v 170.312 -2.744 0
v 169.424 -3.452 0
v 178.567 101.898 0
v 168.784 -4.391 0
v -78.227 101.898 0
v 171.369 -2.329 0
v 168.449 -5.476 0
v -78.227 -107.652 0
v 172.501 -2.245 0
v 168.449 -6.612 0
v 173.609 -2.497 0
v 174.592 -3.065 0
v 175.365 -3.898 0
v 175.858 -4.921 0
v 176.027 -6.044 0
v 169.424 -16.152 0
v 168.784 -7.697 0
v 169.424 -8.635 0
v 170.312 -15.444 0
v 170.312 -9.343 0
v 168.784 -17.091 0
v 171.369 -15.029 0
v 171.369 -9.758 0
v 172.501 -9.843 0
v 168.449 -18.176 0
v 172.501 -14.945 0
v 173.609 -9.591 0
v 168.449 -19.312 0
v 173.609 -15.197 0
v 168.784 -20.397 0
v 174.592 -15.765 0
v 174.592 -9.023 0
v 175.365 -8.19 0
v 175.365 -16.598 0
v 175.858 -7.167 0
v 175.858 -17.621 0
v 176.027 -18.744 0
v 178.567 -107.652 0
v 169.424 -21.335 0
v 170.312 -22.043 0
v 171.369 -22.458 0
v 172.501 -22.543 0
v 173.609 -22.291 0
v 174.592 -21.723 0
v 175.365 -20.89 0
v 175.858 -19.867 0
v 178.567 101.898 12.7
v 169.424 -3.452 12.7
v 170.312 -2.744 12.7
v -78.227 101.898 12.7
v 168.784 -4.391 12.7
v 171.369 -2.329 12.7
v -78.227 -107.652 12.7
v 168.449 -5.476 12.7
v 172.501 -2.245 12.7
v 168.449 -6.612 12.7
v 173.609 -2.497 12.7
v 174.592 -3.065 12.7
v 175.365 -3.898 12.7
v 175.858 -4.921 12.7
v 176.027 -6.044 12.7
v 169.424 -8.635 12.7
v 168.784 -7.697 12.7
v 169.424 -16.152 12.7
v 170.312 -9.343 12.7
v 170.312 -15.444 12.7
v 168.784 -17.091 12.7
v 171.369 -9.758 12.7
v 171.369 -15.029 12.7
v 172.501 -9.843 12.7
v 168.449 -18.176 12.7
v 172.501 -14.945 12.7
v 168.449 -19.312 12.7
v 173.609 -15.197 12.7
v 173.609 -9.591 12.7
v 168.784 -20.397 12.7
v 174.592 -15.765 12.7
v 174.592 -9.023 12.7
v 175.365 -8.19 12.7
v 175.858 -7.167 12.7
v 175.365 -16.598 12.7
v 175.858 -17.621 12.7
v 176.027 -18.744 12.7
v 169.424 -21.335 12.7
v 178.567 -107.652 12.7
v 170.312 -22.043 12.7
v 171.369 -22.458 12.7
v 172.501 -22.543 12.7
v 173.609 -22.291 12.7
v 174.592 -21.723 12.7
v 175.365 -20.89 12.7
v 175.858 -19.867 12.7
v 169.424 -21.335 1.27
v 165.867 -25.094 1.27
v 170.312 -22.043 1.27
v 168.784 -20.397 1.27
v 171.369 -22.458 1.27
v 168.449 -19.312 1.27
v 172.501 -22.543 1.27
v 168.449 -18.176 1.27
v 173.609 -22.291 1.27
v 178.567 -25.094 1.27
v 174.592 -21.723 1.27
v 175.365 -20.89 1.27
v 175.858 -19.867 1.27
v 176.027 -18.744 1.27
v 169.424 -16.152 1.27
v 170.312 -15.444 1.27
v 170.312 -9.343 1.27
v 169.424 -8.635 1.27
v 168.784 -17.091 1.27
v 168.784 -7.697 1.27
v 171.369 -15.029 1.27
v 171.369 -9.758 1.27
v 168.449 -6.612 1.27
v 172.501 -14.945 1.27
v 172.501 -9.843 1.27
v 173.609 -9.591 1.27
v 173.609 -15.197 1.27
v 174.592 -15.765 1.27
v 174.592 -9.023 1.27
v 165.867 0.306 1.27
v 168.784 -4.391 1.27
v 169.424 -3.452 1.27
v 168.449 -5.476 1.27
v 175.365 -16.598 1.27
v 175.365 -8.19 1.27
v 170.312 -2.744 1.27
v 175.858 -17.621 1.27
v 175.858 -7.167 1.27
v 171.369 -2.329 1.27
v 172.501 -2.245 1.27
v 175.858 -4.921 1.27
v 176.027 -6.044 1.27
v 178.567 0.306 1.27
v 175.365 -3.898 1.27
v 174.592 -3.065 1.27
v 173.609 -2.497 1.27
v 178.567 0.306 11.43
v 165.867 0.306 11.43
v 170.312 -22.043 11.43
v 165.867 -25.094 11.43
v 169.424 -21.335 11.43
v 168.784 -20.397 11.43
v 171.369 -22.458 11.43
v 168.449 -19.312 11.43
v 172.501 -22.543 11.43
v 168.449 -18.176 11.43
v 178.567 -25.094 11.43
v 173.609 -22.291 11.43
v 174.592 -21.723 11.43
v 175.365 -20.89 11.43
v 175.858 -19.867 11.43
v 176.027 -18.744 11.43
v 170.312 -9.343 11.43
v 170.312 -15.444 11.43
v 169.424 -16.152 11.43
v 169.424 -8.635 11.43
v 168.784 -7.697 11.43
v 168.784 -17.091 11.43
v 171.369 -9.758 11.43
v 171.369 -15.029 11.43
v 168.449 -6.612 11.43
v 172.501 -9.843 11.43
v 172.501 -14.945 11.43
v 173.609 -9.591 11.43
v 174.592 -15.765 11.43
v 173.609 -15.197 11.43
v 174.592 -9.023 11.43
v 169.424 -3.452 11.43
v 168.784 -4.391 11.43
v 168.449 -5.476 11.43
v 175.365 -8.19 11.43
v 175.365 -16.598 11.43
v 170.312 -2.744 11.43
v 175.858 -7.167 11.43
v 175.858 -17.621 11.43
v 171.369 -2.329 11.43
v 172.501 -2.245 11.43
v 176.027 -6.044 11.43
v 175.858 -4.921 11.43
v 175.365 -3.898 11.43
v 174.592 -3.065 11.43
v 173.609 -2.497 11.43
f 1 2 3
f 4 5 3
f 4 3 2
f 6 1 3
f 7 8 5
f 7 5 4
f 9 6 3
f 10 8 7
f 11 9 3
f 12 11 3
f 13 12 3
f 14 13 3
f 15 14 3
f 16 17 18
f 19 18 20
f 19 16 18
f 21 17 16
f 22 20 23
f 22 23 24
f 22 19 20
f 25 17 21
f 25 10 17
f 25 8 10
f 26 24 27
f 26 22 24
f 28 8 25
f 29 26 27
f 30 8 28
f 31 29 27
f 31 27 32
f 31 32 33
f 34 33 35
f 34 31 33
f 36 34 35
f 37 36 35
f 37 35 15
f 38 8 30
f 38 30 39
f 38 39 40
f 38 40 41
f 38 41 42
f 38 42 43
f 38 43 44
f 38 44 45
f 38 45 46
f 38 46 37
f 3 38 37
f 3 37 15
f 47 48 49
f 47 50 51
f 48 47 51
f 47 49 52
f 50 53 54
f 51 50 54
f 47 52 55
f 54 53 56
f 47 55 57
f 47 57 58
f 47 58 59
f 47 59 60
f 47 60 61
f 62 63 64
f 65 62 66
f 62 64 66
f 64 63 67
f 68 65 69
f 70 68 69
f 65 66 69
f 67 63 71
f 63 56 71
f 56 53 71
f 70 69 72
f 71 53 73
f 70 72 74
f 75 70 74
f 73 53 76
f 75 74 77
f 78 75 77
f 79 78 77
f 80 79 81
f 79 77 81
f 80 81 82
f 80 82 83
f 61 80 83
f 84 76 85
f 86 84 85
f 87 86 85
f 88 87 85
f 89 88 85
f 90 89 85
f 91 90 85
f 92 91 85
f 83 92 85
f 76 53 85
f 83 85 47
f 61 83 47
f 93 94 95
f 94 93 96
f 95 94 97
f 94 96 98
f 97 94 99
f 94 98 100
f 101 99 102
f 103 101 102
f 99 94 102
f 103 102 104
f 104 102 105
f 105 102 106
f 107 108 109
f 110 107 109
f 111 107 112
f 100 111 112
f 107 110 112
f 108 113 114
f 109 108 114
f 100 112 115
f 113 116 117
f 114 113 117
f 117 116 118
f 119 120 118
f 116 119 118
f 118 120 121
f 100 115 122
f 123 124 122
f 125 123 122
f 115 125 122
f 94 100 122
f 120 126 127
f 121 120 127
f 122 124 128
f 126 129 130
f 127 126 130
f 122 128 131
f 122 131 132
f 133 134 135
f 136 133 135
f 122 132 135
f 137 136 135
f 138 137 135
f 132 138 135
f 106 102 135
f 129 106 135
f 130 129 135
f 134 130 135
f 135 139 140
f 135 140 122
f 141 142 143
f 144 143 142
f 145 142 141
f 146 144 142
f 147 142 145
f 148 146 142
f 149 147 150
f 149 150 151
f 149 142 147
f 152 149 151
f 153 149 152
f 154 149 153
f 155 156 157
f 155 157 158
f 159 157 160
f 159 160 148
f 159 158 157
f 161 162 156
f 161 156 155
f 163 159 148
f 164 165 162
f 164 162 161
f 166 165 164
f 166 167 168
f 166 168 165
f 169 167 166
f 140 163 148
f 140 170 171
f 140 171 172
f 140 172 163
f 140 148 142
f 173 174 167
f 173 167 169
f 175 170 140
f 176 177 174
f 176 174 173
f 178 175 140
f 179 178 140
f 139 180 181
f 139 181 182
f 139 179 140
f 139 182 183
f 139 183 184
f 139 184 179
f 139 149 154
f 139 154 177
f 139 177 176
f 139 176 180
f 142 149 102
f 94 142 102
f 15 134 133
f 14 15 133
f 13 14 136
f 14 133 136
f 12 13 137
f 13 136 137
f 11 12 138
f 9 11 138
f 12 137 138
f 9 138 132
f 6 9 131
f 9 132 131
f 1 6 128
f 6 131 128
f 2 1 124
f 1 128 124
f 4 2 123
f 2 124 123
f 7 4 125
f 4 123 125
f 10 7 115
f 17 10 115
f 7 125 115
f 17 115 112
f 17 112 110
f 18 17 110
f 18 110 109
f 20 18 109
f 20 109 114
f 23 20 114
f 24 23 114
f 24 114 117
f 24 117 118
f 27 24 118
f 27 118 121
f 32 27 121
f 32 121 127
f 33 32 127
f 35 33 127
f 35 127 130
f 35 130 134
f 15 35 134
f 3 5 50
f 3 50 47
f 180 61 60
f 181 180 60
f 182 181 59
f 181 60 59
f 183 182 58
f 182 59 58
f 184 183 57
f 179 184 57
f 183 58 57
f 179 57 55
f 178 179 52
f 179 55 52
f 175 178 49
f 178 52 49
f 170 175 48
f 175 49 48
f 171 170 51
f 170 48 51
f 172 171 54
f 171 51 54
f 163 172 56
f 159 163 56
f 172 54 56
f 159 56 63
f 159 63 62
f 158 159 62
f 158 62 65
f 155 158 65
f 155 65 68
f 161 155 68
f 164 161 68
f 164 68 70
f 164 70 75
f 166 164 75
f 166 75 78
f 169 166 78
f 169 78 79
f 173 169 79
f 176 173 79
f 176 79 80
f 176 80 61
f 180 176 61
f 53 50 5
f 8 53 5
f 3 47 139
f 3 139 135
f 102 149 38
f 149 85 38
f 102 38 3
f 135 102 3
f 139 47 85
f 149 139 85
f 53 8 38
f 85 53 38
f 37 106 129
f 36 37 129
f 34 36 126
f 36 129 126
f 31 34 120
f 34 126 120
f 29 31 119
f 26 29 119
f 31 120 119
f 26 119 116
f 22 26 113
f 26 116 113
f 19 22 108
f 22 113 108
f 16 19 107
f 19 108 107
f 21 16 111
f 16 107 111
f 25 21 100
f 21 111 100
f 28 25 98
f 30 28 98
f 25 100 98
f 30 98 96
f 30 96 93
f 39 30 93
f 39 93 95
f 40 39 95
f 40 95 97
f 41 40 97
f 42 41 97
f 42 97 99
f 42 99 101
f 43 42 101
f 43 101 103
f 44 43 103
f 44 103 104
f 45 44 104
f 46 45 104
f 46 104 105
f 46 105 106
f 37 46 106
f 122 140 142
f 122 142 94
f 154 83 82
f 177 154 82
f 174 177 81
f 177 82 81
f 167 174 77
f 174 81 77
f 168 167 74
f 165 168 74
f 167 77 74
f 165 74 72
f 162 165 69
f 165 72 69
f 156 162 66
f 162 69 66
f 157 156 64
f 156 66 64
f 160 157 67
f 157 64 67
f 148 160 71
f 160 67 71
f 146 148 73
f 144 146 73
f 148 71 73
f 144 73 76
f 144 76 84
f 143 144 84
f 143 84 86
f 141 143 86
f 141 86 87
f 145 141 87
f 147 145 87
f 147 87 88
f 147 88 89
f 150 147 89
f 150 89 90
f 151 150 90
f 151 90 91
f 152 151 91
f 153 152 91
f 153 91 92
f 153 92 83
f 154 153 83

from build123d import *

# Parameters (mm, degrees)
SKETCH1_W           = 256.794
SKETCH1_H           = 196.85
BOSS_EXTRUDE1_DEPTH = 12.7
SKETCH2_W           = 10.16
SKETCH2_H           = 25.4
CUT_EXTRUDE1_DEPTH  = 12.7
SKETCH3_R           = 3.81
CUT_EXTRUDE2_DEPTH  = 12.7
SKETCH4_W           = 256.794
SKETCH4_H           = 12.7
BOSS_EXTRUDE2_DEPTH = 12.7


with BuildPart() as part:
    # Sketch1 → Boss-Extrude1 (new body)
    with BuildSketch(Plane.XY):
        with Locations((50.169769953, -9.226877934)):
            Rectangle(SKETCH1_W, SKETCH1_H)
    extrude(amount=BOSS_EXTRUDE1_DEPTH)

    # Sketch2 → Cut-Extrude1 (cut)
    with BuildSketch(Plane(origin=(178.566769953, 0, 0), x_dir=(0, 0, -1), z_dir=(1, 0, 0))):
        with Locations((-6.35, -12.393940124)):
            Rectangle(SKETCH2_W, SKETCH2_H)
    extrude(amount=-CUT_EXTRUDE1_DEPTH, mode=Mode.SUBTRACT)

    # Sketch3 → Cut-Extrude2 (cut)
    with BuildSketch(Plane.XY.offset(12.7)):
        with Locations((172.216769953, -6.043940124)):
            Circle(SKETCH3_R)
        with Locations((172.216769953, -18.743940124)):
            Circle(SKETCH3_R)
    extrude(amount=-CUT_EXTRUDE2_DEPTH, mode=Mode.SUBTRACT)

    # Sketch4 → Boss-Extrude2 (add)
    with BuildSketch(Plane(origin=(0, 89.198122066, 0), x_dir=(1, 0, 0), z_dir=(0, 1, 0))):
        with Locations((50.169769953, -6.35)):
            Rectangle(SKETCH4_W, SKETCH4_H)
    extrude(amount=BOSS_EXTRUDE2_DEPTH)


solid = part.part
